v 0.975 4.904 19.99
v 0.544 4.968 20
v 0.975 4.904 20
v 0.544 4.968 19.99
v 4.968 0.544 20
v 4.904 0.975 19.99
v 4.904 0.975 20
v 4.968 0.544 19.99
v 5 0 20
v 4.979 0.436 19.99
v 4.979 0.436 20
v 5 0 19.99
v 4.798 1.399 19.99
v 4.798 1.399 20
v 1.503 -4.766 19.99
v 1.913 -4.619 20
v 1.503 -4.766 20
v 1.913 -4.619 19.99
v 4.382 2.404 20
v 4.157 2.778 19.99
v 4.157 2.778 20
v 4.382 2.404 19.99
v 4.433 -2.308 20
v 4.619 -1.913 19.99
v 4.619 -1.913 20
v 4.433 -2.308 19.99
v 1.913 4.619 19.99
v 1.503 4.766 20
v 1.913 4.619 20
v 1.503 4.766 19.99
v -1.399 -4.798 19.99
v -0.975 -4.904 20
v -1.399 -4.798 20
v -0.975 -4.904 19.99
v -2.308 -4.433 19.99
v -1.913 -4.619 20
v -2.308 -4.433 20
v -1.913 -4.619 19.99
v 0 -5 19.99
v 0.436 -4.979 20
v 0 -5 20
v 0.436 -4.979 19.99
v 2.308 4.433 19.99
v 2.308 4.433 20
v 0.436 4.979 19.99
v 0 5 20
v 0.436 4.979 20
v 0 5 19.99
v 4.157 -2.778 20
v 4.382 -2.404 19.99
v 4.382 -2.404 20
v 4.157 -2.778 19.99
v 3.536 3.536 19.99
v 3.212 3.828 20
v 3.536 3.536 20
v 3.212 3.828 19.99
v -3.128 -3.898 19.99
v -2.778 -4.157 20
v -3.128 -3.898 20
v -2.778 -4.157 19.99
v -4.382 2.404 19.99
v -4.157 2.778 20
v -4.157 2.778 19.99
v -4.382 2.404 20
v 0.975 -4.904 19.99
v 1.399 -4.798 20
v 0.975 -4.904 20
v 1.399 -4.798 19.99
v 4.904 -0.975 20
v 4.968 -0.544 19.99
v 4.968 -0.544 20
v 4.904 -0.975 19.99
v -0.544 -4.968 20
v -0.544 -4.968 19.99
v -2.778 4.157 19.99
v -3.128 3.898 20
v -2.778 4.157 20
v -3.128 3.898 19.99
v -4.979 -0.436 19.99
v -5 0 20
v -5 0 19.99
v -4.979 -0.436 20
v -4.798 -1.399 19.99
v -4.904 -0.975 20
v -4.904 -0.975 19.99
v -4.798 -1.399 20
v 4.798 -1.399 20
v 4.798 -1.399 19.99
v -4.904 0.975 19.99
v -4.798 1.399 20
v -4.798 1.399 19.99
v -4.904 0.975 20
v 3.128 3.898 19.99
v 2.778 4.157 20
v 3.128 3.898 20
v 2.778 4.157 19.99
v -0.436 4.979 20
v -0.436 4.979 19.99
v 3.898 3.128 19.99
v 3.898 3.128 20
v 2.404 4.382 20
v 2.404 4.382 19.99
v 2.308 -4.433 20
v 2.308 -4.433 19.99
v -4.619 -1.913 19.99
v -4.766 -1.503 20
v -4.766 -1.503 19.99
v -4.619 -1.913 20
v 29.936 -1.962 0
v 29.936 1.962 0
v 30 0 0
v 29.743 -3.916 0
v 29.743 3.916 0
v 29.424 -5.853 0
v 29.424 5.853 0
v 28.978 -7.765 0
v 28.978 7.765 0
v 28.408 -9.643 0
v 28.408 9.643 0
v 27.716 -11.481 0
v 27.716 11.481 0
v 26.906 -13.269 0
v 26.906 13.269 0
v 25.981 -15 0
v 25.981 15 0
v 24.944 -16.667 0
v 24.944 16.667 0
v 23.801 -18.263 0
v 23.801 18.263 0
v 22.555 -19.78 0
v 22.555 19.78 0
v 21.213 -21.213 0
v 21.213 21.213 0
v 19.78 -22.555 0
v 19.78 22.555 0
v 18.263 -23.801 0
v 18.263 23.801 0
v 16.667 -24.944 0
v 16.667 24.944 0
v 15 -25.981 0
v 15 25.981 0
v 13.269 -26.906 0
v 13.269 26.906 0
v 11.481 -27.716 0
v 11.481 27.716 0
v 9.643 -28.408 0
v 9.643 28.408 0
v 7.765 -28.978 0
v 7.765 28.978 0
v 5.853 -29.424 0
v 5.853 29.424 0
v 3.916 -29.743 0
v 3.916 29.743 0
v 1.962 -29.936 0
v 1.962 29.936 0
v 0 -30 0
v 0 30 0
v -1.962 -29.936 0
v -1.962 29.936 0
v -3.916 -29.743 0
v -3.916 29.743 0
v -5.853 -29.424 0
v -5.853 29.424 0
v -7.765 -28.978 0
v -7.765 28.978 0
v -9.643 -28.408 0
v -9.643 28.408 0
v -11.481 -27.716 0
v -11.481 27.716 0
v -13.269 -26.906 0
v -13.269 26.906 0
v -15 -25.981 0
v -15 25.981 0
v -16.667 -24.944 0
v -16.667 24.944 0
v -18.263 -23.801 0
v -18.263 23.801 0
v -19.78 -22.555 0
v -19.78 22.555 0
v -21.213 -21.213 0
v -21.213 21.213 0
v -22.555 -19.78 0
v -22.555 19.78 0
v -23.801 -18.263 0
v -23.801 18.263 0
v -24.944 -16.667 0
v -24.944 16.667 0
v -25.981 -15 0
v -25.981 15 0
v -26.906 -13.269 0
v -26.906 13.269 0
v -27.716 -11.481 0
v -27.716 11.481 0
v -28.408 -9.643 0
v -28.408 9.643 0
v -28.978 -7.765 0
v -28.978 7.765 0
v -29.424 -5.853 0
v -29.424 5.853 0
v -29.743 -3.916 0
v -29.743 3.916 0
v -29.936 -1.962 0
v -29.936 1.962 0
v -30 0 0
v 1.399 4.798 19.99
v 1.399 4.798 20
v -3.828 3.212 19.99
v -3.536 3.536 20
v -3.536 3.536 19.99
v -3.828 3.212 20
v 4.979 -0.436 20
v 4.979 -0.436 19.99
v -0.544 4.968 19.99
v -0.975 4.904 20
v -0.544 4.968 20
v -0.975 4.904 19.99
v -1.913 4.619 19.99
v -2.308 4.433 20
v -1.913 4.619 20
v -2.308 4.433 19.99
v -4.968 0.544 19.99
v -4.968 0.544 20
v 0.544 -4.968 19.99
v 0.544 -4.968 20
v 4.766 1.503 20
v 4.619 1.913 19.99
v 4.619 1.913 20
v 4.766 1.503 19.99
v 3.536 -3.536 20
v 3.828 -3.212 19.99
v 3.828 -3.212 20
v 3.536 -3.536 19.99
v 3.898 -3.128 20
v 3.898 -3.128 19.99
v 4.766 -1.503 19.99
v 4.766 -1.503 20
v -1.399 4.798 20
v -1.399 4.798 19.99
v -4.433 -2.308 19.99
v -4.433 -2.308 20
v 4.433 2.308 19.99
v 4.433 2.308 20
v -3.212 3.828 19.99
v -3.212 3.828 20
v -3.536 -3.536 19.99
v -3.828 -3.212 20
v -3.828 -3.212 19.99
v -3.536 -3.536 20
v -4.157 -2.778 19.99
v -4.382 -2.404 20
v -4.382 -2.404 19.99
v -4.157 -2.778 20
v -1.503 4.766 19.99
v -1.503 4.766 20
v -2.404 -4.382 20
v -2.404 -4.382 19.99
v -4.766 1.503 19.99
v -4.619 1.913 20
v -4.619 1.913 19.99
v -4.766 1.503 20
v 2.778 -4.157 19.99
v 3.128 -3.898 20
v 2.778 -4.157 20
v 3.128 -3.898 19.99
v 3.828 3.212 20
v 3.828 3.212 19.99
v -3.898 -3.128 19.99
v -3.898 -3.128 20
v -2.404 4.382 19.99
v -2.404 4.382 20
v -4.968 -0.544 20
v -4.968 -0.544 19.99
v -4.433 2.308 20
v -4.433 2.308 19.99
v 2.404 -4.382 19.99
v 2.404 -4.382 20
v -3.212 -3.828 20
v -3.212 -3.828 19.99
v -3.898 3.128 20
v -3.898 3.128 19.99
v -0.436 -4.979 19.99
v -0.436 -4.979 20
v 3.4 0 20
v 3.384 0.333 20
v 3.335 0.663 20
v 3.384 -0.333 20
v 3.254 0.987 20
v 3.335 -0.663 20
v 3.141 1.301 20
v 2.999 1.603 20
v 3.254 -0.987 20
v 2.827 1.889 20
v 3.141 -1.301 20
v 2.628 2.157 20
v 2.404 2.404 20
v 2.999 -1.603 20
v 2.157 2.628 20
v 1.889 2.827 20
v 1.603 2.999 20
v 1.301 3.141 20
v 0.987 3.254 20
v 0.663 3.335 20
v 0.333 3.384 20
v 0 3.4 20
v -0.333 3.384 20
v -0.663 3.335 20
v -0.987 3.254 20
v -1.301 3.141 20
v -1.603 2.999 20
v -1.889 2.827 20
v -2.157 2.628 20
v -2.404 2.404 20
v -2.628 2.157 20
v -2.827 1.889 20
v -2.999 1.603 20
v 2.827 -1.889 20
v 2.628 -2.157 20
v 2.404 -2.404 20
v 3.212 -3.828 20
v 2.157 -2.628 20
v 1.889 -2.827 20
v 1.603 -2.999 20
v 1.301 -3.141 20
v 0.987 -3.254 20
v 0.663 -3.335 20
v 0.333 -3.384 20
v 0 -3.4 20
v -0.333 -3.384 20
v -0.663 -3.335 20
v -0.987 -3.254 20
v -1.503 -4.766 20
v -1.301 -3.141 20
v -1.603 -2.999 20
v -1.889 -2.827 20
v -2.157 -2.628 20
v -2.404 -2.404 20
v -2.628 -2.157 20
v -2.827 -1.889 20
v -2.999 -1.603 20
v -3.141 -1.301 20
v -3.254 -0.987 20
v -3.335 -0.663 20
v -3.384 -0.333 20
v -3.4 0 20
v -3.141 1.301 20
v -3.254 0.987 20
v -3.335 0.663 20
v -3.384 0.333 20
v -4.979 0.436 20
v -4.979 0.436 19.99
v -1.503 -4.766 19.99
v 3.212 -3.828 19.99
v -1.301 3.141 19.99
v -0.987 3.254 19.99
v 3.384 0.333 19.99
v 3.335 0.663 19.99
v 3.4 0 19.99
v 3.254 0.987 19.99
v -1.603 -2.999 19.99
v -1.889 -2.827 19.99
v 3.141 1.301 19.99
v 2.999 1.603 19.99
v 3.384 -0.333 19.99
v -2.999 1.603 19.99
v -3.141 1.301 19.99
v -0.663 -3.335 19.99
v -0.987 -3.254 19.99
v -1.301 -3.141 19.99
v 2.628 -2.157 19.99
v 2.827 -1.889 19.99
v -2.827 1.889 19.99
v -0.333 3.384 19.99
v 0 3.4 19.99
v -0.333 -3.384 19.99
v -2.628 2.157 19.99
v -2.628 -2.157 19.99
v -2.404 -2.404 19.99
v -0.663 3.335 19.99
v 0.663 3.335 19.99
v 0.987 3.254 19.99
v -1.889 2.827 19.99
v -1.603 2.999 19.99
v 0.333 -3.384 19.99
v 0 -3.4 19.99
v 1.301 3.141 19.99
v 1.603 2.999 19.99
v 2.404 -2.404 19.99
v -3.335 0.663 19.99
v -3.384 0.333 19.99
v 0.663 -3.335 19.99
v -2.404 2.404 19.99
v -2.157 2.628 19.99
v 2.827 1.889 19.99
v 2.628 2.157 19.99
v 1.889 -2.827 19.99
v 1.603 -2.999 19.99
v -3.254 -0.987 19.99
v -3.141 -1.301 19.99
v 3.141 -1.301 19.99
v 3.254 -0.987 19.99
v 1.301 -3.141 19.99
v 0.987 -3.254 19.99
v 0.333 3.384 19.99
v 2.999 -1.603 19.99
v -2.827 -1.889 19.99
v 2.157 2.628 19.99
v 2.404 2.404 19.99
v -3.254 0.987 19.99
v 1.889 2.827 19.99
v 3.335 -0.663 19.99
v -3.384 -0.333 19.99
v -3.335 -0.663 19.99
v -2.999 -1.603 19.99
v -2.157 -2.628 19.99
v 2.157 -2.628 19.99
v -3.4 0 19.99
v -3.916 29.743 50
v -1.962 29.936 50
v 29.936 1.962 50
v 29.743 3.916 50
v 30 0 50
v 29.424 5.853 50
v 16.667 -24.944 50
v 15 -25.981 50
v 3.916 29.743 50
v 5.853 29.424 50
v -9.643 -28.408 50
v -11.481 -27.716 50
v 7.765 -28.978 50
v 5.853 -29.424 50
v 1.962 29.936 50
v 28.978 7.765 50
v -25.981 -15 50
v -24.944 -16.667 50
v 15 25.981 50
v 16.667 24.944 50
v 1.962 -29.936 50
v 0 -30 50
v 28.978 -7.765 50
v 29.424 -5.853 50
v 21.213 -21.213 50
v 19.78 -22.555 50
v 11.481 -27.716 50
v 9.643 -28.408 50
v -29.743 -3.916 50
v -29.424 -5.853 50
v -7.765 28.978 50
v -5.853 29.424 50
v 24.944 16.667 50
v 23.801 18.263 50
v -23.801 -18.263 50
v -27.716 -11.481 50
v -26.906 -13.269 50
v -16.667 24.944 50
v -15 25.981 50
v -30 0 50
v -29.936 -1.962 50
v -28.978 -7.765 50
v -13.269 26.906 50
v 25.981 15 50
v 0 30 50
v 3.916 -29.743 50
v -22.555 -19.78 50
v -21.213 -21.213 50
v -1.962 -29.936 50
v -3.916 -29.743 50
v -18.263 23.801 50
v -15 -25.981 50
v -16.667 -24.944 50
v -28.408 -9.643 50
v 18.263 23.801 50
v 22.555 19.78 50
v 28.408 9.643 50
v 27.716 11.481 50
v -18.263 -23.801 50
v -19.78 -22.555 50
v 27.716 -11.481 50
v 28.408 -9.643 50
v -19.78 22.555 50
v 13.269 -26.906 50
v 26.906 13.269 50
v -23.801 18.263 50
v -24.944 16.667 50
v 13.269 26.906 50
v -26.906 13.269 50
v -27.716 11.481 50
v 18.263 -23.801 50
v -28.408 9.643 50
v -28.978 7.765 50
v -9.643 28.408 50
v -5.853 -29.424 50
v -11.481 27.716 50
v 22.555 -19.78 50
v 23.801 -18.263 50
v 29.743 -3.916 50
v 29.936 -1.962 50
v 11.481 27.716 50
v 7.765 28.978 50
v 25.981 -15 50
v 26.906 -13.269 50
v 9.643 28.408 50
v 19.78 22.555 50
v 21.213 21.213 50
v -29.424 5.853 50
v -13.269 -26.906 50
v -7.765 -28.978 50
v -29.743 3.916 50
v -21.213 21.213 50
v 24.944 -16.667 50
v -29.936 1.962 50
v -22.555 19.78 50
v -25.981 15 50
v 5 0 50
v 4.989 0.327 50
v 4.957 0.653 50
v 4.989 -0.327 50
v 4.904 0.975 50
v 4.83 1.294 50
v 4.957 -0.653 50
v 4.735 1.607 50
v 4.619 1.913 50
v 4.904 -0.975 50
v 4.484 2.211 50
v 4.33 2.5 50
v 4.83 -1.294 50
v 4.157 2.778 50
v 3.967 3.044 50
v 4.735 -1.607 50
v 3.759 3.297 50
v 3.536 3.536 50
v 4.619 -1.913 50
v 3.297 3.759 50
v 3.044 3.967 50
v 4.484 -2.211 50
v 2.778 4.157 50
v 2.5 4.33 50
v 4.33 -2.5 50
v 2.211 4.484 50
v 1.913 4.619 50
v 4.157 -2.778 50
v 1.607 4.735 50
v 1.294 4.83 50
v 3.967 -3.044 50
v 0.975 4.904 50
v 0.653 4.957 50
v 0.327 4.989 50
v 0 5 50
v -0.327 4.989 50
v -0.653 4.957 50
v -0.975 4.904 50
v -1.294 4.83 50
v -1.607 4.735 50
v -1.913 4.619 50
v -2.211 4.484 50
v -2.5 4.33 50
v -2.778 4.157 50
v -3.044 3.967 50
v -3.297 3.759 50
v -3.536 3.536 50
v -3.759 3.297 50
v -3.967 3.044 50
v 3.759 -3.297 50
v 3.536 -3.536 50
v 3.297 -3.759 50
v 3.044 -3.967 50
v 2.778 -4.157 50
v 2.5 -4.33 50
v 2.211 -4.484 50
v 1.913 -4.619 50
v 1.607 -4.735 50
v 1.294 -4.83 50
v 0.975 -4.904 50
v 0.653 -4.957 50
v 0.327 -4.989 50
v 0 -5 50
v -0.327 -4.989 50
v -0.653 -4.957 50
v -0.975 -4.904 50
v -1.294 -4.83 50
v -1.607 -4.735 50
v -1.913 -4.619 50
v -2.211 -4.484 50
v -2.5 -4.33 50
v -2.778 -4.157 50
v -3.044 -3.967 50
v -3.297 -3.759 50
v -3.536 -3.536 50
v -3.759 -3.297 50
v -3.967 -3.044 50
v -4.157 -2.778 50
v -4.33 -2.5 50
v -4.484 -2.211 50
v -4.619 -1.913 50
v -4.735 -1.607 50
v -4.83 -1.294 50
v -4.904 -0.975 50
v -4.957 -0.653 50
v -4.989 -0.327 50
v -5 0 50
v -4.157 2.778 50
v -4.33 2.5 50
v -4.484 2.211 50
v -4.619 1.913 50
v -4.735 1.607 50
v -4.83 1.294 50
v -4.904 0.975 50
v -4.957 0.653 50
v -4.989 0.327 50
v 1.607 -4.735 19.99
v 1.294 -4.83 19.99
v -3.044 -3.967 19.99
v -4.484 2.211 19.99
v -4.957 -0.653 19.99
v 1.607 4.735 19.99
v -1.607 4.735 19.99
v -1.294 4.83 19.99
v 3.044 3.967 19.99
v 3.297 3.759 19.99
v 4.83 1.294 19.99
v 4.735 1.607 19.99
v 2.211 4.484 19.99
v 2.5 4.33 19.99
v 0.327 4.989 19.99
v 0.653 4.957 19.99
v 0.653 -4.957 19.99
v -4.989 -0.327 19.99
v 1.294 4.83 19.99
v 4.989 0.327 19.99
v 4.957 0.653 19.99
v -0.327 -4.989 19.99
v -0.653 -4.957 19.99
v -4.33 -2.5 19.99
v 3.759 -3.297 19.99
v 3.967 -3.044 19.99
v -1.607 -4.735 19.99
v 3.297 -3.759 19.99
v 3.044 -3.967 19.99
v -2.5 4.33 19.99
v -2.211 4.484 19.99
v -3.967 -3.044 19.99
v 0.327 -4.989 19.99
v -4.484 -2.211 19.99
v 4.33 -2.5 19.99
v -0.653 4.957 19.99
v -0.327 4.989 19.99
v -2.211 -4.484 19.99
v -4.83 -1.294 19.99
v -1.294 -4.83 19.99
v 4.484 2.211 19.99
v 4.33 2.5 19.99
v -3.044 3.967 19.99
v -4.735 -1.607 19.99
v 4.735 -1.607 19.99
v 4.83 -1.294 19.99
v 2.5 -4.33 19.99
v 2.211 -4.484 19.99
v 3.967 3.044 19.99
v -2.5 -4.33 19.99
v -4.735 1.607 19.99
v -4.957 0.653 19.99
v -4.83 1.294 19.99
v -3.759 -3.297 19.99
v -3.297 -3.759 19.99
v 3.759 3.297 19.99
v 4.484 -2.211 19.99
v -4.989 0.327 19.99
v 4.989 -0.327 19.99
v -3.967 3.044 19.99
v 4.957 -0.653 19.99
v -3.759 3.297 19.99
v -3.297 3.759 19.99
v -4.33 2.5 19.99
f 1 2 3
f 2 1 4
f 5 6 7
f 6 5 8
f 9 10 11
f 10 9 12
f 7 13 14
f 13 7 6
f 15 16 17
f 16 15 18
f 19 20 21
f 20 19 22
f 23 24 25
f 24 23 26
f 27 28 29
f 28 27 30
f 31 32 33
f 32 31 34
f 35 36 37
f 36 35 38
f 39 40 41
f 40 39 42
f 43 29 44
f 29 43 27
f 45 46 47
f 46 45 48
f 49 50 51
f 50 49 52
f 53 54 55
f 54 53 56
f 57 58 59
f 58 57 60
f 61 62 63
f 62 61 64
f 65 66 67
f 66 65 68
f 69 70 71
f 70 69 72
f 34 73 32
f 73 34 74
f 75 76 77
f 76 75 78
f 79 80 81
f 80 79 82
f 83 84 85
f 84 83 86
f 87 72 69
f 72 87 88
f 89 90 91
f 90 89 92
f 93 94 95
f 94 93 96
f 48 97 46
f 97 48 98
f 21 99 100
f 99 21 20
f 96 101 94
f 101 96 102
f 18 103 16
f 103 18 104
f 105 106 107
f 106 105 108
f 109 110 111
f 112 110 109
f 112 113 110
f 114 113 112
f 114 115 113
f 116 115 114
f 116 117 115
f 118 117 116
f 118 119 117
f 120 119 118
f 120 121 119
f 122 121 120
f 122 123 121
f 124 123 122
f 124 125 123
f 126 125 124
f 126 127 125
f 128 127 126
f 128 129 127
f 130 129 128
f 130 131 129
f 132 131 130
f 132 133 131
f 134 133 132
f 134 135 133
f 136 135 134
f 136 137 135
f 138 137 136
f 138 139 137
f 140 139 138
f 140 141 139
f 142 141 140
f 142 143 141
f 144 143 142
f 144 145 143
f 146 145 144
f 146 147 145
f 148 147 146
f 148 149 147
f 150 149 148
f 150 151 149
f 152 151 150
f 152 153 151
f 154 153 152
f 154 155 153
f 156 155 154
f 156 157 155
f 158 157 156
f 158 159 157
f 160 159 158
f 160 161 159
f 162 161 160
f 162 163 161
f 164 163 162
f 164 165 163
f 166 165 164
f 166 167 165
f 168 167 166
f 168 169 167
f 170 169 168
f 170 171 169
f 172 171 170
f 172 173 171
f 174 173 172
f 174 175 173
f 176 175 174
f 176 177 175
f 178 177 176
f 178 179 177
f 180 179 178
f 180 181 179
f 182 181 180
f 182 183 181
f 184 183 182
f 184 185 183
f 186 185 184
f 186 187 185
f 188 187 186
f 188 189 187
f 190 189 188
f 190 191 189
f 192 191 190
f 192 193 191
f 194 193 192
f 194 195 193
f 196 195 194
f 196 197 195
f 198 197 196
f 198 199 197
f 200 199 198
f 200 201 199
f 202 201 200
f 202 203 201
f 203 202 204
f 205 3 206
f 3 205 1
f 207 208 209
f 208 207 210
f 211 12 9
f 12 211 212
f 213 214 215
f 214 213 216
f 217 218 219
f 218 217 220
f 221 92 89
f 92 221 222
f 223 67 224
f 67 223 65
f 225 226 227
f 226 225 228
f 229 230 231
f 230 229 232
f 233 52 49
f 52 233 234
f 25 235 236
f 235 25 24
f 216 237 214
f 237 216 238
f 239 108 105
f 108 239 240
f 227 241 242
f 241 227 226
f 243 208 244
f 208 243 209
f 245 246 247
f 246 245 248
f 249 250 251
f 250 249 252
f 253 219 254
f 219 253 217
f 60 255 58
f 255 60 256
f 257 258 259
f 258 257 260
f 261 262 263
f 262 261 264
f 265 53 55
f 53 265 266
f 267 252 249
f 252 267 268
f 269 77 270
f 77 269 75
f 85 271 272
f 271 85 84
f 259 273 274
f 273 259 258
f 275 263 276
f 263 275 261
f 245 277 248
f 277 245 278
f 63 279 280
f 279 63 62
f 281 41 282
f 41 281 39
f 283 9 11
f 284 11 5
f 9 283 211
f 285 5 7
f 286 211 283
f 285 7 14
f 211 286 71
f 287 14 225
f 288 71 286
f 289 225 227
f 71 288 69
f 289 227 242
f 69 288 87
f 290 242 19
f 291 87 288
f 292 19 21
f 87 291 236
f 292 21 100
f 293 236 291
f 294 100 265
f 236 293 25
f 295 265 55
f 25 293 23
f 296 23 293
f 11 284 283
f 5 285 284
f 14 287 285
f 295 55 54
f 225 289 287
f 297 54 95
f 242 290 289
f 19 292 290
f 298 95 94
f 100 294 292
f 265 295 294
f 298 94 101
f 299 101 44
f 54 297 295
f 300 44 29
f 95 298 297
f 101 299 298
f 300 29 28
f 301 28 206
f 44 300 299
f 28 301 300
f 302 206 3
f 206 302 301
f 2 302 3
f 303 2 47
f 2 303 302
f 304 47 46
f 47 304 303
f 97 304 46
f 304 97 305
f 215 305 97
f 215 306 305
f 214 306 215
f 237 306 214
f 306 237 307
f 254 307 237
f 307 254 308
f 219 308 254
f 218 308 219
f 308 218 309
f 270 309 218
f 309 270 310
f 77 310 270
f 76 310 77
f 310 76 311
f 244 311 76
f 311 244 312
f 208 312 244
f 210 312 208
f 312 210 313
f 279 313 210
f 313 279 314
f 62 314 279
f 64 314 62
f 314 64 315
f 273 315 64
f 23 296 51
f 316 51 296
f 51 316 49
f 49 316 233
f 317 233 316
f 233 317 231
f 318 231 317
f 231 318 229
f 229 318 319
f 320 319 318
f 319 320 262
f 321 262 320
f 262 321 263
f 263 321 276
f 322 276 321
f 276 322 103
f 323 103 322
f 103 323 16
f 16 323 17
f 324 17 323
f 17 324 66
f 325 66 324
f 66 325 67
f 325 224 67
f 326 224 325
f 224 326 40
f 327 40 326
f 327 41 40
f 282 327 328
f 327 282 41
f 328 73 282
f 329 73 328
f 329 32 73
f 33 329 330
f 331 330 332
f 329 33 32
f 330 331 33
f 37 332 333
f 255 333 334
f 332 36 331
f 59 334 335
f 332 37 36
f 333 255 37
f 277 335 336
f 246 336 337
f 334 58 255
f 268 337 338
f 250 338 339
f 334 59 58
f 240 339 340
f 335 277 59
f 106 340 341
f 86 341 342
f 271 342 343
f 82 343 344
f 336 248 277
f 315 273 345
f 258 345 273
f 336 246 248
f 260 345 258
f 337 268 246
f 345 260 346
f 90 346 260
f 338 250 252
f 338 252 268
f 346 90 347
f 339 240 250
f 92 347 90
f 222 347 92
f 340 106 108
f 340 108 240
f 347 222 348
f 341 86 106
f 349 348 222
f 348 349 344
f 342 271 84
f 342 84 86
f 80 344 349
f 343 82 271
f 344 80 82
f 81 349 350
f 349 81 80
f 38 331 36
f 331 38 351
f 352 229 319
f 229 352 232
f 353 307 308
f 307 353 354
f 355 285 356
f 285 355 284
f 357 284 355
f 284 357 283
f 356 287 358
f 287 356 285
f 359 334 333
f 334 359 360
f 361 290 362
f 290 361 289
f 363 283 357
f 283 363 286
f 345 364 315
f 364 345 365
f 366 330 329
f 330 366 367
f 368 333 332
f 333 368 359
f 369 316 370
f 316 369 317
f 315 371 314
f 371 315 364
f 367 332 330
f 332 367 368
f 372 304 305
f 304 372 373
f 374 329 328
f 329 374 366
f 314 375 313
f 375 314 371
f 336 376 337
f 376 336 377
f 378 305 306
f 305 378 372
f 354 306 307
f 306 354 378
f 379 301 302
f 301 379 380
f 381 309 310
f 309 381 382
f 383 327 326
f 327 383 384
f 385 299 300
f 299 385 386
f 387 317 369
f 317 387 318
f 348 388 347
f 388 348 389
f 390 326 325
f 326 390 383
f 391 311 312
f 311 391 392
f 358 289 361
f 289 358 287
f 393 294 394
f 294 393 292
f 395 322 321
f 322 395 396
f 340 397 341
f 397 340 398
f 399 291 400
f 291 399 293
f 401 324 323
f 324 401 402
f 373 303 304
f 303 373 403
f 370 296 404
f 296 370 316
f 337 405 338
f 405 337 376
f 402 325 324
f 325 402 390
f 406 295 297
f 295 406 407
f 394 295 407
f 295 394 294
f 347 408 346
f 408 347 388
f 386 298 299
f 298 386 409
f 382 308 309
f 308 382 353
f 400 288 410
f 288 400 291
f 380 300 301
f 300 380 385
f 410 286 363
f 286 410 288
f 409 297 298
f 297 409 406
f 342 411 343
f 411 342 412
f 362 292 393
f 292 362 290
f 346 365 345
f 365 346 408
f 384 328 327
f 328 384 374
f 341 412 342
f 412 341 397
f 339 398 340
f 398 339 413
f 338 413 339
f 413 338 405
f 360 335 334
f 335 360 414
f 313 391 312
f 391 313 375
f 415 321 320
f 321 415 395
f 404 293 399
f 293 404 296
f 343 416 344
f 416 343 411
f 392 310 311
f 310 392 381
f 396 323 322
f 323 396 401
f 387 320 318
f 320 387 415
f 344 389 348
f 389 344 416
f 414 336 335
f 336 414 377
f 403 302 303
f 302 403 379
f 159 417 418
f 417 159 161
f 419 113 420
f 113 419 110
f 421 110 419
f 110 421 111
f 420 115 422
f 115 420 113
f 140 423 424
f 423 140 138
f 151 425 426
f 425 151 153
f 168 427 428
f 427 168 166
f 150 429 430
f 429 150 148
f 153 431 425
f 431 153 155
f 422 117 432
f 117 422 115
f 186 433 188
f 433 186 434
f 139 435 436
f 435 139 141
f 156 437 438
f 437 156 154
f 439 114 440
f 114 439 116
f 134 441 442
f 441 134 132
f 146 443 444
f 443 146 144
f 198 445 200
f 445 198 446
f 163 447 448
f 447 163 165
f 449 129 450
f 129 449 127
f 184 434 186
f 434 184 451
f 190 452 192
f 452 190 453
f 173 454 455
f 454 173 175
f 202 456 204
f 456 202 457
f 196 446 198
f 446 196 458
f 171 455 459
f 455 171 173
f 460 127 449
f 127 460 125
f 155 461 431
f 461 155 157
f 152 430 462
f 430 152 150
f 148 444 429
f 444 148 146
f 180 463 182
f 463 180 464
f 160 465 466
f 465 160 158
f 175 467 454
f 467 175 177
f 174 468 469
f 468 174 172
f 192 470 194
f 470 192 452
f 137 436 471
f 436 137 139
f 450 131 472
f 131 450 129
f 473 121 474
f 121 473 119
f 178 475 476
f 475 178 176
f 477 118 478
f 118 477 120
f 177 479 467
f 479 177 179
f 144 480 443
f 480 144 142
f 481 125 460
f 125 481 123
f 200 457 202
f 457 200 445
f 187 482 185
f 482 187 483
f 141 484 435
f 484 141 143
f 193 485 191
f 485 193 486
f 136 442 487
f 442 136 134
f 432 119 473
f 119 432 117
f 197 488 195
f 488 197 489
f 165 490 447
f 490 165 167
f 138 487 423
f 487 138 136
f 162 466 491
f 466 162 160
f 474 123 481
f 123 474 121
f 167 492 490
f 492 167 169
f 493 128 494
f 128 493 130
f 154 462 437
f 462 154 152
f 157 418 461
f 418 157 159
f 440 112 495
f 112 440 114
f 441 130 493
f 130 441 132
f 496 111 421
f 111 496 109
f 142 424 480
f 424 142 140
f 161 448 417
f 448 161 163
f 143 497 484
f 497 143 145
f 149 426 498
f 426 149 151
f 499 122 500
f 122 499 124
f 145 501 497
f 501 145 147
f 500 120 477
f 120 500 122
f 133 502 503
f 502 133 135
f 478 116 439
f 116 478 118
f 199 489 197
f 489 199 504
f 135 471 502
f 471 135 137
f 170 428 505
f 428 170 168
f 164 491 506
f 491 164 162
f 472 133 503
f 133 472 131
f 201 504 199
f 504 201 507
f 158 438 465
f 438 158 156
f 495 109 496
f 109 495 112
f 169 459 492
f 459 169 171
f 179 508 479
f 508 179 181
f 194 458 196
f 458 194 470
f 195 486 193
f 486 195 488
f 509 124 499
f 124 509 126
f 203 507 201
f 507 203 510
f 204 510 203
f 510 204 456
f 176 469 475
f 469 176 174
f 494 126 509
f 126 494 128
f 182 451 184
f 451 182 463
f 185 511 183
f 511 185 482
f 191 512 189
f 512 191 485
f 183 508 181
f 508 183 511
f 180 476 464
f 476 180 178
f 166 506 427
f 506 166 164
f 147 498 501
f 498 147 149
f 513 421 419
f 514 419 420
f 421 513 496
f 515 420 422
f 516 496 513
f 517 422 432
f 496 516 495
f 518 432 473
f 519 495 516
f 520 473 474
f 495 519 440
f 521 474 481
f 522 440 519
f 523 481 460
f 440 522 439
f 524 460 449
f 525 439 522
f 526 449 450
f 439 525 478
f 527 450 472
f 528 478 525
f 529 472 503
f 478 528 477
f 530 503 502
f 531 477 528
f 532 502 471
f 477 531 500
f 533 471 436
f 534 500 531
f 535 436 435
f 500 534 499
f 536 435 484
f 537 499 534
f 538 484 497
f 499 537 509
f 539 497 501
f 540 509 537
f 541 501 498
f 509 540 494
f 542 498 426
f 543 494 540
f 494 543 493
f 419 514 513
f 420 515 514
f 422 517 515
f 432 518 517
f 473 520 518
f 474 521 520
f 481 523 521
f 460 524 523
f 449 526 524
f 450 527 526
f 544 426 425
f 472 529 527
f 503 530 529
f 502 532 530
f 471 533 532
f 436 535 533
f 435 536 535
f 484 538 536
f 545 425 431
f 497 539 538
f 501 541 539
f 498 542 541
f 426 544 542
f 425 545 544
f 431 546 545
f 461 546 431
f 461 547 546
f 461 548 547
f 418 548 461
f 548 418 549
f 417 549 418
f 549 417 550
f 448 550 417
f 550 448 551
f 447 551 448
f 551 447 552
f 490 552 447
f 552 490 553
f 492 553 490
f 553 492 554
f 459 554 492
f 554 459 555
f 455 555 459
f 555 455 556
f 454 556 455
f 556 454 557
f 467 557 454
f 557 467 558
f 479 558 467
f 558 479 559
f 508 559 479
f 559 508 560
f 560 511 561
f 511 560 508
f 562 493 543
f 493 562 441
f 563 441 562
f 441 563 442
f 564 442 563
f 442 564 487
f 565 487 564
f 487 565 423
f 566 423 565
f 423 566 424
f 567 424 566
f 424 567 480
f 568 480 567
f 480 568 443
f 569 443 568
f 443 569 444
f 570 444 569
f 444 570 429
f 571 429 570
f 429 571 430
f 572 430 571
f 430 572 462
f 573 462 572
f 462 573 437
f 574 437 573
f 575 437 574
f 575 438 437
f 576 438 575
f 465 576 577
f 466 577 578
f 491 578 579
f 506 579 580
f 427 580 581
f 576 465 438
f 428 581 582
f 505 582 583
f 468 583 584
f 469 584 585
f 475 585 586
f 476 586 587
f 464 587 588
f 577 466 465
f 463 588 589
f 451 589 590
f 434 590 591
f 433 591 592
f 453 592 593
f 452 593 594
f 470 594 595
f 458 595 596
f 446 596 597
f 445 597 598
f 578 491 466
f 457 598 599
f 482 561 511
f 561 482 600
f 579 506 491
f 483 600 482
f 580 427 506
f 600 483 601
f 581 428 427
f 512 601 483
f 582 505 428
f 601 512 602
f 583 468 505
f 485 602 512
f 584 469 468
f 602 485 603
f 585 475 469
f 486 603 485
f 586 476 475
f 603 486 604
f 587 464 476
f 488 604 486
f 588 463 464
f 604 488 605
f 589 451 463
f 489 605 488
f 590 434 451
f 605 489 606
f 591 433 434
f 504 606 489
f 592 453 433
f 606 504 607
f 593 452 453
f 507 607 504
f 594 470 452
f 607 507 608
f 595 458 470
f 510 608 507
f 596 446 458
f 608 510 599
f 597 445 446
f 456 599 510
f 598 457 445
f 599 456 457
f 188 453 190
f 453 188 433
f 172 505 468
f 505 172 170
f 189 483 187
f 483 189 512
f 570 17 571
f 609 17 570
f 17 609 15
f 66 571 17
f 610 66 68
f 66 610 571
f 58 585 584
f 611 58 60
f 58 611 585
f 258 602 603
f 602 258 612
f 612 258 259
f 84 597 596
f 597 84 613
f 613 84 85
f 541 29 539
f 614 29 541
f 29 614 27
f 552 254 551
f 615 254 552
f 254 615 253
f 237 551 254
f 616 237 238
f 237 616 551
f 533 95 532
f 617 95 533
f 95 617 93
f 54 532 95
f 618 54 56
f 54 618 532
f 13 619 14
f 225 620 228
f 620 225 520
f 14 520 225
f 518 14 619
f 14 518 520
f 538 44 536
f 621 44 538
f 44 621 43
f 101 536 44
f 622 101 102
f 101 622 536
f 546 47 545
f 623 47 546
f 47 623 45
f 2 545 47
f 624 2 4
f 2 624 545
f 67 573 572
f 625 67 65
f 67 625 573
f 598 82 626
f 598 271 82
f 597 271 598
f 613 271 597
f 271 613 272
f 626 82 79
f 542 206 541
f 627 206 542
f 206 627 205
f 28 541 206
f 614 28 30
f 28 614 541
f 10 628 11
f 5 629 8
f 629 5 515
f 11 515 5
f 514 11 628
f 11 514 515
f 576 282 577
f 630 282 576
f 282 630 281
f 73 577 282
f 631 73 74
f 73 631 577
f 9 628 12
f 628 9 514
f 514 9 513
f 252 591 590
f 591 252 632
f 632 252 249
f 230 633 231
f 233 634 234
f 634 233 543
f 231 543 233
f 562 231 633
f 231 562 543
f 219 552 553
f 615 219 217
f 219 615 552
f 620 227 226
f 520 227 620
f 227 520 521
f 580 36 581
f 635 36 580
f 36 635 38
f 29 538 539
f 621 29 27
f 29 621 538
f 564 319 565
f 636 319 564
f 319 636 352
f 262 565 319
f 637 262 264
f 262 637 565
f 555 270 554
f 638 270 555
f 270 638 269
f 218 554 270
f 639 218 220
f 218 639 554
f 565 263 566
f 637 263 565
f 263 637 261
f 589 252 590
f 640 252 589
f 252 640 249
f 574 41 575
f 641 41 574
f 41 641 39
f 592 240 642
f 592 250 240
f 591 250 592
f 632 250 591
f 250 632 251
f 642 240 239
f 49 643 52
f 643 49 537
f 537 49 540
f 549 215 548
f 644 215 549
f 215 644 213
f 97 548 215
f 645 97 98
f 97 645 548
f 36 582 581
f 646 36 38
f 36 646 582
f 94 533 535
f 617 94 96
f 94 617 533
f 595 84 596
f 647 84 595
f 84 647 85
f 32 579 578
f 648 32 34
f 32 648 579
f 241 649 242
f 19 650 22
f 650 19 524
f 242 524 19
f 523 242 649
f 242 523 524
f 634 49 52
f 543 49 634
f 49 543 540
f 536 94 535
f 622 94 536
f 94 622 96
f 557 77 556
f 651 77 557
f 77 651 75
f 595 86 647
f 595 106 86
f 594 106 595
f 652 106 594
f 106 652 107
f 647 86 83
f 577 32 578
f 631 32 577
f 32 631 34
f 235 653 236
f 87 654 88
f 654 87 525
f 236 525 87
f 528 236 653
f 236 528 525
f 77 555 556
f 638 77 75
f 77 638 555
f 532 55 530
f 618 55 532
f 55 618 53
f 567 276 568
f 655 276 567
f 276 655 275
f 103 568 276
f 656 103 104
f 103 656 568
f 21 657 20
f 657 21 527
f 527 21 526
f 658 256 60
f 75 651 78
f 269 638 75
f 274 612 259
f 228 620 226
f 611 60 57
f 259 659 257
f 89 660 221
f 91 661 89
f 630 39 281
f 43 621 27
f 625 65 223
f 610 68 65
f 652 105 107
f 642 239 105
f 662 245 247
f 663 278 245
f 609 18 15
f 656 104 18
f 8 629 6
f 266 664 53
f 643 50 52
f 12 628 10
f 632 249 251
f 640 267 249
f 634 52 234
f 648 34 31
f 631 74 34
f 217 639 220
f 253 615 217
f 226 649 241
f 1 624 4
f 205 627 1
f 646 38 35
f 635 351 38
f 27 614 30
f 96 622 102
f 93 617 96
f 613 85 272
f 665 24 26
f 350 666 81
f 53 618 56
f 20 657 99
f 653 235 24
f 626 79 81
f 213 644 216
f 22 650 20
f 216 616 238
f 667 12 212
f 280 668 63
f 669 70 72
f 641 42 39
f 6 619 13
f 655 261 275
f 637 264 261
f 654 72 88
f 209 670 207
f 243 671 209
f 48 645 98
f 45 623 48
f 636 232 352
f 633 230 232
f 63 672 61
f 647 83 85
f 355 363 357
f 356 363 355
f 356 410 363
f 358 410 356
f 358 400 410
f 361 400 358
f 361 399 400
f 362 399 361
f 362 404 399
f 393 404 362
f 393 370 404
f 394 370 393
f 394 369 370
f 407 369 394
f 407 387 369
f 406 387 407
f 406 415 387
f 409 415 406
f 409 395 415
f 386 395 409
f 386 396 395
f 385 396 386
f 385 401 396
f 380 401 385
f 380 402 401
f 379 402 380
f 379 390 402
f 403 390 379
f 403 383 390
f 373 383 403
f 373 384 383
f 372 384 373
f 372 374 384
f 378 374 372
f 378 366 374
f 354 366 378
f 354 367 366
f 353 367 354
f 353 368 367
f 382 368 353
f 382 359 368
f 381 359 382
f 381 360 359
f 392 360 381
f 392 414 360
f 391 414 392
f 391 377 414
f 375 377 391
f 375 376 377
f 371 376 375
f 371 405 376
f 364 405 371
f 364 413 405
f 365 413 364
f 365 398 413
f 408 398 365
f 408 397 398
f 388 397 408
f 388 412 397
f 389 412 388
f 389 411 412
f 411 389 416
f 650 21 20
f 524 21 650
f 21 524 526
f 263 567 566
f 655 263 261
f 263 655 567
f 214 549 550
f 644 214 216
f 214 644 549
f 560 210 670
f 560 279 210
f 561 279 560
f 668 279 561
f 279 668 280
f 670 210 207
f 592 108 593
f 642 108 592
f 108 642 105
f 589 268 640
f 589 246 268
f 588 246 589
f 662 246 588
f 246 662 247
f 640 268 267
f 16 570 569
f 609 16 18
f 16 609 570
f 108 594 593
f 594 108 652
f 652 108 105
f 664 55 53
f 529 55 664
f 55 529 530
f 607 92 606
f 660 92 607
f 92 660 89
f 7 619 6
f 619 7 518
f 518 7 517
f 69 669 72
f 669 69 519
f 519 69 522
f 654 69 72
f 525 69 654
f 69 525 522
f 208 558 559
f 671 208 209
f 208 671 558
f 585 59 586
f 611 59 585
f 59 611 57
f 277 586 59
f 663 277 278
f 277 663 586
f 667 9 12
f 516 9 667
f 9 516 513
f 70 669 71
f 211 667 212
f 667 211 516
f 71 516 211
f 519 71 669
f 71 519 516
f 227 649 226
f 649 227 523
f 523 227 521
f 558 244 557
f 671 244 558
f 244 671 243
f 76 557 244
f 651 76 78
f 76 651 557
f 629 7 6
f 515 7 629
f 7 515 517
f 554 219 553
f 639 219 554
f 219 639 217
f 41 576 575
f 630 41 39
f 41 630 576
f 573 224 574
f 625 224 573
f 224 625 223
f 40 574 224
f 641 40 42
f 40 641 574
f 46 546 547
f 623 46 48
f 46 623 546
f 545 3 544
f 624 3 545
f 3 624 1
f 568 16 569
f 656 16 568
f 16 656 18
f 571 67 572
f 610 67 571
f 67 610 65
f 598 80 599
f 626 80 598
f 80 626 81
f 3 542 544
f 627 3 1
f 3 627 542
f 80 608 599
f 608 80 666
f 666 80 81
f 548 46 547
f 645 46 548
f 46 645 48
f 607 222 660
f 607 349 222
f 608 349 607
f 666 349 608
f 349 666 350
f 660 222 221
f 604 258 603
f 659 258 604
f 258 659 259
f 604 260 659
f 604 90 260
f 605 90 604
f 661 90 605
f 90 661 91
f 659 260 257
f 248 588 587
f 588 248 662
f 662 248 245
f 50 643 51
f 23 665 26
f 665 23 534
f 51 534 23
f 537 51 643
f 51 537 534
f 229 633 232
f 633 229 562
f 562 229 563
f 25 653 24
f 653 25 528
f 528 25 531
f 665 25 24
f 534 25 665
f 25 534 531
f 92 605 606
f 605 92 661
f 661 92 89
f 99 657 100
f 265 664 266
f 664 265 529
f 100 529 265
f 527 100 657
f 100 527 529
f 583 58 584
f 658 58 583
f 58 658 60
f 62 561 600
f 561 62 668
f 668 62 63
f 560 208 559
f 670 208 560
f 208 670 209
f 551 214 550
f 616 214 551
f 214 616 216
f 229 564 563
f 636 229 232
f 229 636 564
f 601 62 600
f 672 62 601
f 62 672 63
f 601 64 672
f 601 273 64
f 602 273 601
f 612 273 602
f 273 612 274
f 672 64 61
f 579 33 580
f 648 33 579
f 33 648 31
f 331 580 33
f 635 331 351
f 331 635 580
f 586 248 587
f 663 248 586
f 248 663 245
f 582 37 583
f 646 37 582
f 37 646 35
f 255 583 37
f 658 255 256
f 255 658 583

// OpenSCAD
// Funnel with spout - printed upright, wide opening at the top
// Units: mm. Wall thickness 1.6 mm throughout.

// ---------- Parameters ----------
spout_d        = 10;    // spout outer diameter
spout_bore     = spout_d - 2 * 1.6;  // spout bore (6.8 mm)
spout_len      = 20;    // spout length (z = 0 to 20)
cone_top_d     = 10;    // cone outer diameter at z = 20 (top of spout)
cone_rim_d     = 60;    // cone outer diameter at rim (z = 50)
cone_h         = cone_rim_d - cone_top_d;  // cone height (40 mm)
eps            = 0.5;   // cutter overshoot past faces

$fn = 64;

// ---------- Model ----------
union() {
    // Spout: tube from z = 0 to z = 20
    difference() {
        cylinder(d = spout_d, h = spout_len);
        translate([0, 0, -eps])
            cylinder(d = spout_bore, h = spout_len + 2 * eps);
    }

    // Cone: widens from 10 mm at z = 20 to 60 mm at z = 50
    difference() {
        cylinder(d = cone_rim_d, h = cone_h, $fn = 96);
        translate([0, 0, spout_len - 0.01])
            cylinder(d = cone_top_d, h = cone_h + 0.01, $fn = 96);
    }
}
